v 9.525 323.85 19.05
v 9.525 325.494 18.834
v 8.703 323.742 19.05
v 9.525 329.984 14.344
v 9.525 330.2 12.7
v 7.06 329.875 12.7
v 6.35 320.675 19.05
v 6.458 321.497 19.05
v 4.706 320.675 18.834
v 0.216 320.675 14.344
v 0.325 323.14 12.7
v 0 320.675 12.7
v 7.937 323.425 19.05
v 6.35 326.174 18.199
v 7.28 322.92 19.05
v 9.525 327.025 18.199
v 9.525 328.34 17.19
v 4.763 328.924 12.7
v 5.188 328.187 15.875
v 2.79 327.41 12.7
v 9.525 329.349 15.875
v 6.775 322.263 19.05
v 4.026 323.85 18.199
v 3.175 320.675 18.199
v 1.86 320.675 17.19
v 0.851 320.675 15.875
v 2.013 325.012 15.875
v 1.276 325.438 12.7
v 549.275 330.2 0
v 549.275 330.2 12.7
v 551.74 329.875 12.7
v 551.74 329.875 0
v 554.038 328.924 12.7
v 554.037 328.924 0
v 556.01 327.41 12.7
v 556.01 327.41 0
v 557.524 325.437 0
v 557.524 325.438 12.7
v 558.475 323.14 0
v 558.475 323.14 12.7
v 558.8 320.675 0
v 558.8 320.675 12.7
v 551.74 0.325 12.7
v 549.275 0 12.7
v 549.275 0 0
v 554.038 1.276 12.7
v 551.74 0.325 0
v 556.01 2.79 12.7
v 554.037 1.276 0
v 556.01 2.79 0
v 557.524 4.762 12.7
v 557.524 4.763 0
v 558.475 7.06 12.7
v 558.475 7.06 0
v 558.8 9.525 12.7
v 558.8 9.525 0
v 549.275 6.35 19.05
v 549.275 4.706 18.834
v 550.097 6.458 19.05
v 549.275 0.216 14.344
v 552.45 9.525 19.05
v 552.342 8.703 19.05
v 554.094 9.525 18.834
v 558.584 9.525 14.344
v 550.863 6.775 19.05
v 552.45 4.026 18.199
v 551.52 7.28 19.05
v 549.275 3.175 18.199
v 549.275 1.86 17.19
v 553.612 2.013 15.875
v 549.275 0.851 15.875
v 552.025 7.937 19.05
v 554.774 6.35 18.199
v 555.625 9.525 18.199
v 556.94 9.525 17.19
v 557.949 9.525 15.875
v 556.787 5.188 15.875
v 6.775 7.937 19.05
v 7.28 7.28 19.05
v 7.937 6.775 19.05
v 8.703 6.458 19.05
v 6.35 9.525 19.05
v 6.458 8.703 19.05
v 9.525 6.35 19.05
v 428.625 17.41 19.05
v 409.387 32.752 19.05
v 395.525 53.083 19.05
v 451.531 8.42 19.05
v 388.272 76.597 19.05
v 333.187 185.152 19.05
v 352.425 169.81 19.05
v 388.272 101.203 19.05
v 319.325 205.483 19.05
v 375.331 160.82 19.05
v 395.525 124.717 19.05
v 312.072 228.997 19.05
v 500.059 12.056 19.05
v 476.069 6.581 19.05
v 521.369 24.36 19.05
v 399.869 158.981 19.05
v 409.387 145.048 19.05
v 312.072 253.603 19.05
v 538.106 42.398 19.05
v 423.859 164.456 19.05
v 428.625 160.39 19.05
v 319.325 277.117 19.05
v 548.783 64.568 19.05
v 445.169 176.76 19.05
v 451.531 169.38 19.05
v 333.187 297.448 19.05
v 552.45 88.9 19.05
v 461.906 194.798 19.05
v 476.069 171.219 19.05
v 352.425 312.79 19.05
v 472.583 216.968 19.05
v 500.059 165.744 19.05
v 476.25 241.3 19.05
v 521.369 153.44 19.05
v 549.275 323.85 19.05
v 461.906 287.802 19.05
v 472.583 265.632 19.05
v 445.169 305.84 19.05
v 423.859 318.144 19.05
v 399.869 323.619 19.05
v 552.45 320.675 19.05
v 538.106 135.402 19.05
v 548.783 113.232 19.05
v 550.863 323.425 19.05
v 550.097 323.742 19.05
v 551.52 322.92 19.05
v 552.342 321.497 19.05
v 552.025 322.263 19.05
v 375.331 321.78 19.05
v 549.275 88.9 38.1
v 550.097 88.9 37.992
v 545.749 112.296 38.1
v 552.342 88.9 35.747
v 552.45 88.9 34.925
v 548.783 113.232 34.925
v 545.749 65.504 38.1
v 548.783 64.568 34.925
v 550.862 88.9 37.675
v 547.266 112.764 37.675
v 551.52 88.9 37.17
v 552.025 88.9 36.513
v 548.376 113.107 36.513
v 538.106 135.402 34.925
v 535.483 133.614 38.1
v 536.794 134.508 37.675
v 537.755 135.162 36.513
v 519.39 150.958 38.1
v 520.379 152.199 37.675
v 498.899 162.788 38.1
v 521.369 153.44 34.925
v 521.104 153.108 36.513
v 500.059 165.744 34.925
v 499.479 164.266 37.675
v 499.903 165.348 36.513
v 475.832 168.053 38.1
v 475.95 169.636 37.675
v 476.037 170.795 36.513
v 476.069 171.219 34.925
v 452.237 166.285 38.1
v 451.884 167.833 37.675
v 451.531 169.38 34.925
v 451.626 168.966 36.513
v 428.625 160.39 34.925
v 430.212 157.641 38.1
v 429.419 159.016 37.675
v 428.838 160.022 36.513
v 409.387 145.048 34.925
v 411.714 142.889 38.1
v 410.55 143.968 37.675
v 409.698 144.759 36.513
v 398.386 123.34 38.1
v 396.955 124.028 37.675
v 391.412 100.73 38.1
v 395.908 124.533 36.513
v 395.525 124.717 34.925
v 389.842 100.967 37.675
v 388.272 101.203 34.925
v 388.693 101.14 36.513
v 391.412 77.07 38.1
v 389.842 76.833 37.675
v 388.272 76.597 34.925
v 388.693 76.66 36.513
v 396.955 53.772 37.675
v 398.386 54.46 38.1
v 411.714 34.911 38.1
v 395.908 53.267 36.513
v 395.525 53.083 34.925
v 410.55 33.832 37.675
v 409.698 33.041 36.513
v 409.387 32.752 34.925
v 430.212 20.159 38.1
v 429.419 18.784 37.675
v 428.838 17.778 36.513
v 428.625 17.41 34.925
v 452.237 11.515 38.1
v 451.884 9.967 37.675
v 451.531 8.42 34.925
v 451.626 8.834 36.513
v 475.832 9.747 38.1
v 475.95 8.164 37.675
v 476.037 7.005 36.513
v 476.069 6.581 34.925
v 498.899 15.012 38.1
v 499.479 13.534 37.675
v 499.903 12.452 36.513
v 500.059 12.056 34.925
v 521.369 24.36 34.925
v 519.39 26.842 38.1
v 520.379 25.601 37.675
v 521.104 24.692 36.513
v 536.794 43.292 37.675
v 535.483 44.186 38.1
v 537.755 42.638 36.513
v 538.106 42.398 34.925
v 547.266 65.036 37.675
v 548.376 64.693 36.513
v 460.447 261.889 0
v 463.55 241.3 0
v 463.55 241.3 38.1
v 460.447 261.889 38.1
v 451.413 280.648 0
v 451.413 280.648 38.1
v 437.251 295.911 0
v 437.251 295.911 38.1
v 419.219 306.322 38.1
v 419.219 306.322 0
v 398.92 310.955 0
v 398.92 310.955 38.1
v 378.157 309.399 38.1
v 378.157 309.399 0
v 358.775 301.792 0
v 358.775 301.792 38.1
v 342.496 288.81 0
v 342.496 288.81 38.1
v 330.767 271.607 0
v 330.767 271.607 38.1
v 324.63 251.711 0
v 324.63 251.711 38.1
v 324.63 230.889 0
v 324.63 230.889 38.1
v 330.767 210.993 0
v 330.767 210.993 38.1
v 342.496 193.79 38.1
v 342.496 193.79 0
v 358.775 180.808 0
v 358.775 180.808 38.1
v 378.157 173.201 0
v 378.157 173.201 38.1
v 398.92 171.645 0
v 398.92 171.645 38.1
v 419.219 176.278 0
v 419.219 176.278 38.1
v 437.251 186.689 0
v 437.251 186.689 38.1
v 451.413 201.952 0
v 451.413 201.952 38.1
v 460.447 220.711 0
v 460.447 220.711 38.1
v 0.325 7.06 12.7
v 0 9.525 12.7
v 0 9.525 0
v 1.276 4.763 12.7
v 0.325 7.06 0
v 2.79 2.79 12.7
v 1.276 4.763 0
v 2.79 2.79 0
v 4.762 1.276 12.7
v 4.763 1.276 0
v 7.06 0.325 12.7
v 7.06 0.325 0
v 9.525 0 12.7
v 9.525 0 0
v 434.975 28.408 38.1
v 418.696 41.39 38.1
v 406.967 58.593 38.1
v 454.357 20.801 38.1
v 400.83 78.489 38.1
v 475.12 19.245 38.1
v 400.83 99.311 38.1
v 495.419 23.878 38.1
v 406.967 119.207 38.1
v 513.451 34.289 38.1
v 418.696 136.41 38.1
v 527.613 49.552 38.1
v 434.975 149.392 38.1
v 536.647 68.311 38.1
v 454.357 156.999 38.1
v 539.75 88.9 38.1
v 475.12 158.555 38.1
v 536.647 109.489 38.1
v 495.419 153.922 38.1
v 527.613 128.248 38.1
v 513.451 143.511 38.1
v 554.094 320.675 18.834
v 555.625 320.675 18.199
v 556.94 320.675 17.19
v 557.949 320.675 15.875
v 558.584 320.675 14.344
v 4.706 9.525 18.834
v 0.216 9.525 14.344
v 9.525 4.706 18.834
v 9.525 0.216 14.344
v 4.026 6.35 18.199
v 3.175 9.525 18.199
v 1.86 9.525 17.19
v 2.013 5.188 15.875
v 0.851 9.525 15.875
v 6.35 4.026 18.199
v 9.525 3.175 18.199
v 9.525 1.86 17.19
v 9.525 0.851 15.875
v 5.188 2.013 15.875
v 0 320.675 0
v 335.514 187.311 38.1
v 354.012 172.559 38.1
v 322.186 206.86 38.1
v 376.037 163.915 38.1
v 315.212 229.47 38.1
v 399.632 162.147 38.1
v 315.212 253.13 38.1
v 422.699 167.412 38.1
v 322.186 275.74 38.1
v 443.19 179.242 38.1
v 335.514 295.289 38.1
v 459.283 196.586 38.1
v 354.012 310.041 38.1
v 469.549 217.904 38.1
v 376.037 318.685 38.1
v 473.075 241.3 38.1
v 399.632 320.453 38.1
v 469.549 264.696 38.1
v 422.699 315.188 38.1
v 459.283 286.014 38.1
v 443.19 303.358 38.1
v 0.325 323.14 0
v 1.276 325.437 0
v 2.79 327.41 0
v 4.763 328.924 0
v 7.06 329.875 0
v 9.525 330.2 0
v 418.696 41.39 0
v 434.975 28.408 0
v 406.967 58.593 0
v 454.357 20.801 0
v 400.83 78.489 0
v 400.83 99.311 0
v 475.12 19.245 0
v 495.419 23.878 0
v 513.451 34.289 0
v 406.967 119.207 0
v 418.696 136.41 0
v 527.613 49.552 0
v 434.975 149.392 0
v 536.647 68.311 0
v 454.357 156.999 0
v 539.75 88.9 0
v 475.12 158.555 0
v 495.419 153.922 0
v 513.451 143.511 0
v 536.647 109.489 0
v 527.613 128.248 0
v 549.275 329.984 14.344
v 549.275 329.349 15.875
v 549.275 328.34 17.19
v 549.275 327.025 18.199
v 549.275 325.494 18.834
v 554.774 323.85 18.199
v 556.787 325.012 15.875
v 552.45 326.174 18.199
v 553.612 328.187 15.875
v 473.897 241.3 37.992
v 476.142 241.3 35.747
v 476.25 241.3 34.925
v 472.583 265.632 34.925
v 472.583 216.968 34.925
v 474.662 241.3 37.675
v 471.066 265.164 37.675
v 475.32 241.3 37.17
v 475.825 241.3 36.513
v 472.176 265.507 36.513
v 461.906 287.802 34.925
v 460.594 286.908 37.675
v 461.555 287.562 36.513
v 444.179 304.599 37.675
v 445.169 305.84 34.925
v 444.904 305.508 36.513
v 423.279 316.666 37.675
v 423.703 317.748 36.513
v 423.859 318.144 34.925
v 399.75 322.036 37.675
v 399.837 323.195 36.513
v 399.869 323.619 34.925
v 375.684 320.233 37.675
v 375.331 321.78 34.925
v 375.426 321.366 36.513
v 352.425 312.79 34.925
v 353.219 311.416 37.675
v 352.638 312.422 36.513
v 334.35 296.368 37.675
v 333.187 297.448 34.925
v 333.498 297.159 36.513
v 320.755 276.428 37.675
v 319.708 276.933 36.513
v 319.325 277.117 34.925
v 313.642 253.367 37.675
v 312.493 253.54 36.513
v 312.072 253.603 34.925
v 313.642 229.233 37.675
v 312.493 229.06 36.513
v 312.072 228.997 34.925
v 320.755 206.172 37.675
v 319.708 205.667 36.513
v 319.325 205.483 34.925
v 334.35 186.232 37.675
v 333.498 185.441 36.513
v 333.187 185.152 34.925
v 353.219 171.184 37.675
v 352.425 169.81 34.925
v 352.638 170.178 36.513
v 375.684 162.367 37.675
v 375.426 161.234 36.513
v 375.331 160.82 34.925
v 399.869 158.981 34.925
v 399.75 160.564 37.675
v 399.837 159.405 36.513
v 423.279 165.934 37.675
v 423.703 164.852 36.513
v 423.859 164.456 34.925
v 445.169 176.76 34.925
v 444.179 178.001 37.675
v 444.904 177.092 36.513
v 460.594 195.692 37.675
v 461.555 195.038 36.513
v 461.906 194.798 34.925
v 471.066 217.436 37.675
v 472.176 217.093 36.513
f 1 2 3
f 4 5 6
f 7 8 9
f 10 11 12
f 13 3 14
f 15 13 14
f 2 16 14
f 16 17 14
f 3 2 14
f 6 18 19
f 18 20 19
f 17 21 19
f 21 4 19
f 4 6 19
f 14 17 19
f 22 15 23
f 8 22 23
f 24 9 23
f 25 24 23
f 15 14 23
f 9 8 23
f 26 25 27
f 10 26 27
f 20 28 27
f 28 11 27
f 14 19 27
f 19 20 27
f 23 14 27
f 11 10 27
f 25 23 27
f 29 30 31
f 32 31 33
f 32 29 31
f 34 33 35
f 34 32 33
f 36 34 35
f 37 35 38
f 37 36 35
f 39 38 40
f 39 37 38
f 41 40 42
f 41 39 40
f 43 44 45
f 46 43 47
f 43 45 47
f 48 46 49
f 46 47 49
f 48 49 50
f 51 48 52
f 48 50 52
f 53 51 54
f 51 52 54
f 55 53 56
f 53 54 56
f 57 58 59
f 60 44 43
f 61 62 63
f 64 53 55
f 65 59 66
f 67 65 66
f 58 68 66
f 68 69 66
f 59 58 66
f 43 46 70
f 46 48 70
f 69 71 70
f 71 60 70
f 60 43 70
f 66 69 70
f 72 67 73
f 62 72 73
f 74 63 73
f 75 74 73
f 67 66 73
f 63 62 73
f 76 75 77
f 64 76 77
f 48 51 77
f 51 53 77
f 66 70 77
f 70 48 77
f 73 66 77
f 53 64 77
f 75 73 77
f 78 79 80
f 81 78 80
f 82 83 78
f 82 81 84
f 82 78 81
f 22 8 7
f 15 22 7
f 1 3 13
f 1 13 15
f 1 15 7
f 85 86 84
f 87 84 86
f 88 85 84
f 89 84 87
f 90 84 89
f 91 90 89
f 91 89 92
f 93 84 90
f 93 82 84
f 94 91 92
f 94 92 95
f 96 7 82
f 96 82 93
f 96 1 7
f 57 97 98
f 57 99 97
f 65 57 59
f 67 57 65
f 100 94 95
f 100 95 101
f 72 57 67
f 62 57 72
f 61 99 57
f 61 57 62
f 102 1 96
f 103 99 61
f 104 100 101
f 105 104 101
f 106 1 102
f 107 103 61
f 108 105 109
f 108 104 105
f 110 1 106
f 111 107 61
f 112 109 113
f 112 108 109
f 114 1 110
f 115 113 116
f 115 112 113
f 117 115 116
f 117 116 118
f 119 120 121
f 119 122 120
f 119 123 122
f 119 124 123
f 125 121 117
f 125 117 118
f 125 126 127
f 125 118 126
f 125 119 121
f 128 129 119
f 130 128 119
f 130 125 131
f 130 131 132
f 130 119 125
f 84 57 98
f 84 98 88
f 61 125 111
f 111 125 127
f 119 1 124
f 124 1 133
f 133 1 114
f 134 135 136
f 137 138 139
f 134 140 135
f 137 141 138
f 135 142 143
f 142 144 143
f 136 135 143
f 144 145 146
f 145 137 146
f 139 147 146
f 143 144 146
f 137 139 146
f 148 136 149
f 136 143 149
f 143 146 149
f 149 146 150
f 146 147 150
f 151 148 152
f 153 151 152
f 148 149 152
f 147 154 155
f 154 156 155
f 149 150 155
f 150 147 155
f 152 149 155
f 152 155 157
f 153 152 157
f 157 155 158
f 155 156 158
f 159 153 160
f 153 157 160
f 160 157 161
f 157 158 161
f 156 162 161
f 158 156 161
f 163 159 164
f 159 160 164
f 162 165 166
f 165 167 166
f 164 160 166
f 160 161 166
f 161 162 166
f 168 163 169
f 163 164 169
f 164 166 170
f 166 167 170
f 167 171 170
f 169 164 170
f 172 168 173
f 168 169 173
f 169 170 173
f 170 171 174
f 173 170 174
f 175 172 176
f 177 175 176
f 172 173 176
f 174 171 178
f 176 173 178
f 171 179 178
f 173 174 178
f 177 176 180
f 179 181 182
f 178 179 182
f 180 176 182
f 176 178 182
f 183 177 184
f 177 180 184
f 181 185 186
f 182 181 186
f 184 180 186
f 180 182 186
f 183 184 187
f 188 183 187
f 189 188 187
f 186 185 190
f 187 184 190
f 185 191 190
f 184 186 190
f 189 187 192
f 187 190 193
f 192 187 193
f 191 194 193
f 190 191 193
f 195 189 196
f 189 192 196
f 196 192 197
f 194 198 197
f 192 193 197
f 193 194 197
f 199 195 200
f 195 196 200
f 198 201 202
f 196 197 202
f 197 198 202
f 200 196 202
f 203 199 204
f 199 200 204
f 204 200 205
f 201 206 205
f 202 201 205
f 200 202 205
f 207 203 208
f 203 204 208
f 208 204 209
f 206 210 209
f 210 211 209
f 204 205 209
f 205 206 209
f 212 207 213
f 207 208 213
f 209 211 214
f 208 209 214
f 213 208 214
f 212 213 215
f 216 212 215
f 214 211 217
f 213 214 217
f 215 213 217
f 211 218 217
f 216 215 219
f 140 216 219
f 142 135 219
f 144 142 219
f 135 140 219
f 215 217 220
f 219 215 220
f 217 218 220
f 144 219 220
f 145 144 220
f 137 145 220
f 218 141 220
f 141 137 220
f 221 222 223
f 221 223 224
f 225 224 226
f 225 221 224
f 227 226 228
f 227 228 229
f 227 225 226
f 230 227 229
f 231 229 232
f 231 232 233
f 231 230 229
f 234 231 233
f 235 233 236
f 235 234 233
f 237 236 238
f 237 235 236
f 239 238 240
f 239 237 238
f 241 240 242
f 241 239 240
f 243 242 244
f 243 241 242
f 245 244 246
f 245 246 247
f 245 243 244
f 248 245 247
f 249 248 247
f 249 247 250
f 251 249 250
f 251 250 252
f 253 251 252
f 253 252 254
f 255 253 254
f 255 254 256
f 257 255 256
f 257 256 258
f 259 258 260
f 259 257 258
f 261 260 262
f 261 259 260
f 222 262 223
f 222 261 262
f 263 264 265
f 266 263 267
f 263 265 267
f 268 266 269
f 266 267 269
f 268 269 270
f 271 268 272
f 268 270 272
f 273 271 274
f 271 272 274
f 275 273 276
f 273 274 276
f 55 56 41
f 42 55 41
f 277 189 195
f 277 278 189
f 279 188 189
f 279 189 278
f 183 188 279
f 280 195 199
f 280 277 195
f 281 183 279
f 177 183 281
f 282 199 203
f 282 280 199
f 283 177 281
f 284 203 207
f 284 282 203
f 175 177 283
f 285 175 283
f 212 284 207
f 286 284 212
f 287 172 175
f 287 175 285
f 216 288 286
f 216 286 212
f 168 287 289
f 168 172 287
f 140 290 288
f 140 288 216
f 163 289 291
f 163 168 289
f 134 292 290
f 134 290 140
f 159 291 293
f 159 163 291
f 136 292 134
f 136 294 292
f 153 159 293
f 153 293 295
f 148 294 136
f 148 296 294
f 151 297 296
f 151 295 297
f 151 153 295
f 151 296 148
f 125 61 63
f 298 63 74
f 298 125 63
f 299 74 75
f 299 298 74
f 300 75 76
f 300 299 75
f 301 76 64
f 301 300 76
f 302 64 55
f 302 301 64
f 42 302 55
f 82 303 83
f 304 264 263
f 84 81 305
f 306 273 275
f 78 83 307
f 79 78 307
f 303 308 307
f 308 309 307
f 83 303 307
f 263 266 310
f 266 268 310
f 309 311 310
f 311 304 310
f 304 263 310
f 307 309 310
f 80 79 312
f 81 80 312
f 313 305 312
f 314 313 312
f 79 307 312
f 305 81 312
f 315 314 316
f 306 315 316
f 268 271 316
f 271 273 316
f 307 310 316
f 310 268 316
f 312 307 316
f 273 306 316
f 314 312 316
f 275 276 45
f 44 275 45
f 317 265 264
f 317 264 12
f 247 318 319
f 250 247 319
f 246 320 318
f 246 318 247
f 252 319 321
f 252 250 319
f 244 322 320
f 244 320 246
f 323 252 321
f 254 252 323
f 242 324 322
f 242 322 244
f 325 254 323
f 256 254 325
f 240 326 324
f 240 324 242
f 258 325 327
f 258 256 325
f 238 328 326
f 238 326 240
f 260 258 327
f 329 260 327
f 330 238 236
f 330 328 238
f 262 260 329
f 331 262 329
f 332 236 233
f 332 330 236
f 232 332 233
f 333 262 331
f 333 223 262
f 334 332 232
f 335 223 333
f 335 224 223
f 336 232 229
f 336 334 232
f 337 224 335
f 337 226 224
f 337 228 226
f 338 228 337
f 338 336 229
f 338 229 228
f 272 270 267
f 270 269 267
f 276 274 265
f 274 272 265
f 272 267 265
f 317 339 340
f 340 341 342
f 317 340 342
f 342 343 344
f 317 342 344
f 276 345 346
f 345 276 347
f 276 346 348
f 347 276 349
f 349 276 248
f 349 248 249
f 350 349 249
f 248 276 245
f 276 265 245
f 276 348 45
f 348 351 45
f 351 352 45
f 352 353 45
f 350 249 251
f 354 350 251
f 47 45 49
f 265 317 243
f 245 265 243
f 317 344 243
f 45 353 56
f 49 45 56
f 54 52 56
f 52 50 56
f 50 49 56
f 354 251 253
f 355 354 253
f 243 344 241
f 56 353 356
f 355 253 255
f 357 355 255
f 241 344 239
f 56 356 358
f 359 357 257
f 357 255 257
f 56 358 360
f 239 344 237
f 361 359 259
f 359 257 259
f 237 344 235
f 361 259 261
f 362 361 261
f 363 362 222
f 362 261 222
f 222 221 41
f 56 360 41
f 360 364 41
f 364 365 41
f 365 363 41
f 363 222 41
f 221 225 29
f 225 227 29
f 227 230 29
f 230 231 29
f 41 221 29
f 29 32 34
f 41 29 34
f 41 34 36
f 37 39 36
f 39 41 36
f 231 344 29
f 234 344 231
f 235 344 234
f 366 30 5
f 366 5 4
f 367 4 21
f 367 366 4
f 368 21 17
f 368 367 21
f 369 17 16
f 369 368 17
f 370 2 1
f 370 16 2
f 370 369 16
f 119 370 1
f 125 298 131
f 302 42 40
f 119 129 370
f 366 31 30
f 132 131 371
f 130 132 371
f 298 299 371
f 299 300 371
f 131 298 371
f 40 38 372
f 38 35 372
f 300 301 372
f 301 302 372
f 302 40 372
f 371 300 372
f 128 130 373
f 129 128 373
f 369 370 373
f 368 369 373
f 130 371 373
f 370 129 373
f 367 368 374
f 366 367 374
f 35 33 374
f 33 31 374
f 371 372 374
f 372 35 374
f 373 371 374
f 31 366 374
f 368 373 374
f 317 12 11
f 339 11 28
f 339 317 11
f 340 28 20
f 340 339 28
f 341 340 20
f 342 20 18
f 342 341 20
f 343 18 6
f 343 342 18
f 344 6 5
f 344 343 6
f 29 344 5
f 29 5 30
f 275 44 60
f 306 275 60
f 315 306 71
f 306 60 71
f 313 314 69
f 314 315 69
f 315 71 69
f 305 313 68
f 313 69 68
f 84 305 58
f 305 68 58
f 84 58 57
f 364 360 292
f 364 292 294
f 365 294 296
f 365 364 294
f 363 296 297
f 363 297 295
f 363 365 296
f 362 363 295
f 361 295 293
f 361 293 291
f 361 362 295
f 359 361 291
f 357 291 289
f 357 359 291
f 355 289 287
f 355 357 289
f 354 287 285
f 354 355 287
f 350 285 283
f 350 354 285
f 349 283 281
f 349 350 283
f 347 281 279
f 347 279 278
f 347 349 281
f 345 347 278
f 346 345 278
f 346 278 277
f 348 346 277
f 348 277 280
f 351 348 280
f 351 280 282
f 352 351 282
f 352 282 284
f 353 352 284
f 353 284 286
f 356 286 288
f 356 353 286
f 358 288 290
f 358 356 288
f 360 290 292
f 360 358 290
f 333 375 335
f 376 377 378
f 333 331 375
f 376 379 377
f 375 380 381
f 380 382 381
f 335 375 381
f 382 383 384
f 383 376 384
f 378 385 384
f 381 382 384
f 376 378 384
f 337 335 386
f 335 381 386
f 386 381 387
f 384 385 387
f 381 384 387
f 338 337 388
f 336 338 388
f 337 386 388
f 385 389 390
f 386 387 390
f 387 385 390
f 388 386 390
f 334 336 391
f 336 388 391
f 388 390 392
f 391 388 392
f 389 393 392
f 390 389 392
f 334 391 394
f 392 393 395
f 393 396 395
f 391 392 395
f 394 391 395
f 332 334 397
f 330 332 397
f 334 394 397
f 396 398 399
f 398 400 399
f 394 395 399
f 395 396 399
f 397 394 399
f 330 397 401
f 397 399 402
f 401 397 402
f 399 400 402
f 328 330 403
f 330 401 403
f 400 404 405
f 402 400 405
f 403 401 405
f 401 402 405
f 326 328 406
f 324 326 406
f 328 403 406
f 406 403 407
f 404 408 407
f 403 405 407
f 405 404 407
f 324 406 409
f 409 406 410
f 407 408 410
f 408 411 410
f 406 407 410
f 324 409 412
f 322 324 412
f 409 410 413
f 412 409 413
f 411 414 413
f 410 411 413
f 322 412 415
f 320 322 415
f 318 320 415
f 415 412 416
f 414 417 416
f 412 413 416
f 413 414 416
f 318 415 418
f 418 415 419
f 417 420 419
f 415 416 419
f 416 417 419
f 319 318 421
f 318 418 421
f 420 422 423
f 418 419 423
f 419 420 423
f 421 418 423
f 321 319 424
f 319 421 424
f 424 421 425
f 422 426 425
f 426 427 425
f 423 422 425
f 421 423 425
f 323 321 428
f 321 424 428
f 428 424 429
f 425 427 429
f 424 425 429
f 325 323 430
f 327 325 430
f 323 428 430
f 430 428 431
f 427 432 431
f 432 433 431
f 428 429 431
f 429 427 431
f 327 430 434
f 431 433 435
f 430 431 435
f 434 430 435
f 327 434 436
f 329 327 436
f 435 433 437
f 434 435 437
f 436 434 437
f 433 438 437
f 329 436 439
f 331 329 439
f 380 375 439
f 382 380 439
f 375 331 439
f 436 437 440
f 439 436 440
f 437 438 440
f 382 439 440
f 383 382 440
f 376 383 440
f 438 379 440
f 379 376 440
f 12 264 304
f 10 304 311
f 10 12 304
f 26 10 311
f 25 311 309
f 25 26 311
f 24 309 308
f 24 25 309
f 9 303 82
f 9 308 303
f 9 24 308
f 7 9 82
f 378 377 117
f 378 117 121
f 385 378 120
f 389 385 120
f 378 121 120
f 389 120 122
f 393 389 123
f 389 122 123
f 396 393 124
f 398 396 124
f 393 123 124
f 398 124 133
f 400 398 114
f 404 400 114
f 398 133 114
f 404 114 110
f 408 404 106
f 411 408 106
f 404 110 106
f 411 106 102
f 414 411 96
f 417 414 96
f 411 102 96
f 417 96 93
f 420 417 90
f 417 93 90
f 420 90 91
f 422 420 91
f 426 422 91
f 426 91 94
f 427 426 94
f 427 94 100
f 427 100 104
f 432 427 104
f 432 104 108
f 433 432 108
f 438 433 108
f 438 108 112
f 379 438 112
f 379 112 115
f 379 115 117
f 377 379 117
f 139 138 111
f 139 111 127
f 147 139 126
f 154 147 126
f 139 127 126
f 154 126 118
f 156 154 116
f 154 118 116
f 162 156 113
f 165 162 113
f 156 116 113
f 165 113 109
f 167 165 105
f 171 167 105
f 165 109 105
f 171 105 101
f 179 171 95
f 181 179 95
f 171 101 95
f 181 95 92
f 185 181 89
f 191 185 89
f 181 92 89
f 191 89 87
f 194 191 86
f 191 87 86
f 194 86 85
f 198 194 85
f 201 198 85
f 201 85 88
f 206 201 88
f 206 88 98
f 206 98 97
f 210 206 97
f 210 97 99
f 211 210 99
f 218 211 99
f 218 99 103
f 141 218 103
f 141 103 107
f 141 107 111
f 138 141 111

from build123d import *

# Parameters (mm, degrees)
F0_R         = 82.55
F0_R_2       = 69.85
F1_DEPTH     = 38.1
F0_W         = 558.8
F0_H         = 330.2
F2_DEPTH     = 19.05
F3_R         = 6.34999
F4_T1_DEPTH  = 42.8625
F4_T4_ANGLE  = 90
F4_T6_ANGLE  = 90
F4_T8_ANGLE  = 90
F4_T10_ANGLE = 90
F5_R         = 3.175


# Not quite as in the source:
# - a fillet or chamfer that OpenCascade refuses, or shapes differently, is made with other operations: its cross-section is extruded or revolved along the edge and cut away or added
# - a fillet or chamfer is up to 0.001 mm smaller than in the source, because OpenCascade refuses the exact size


with BuildPart() as f1:
    # F0 (on Top) → F1 (new body)
    with BuildSketch(Plane.XY):
        with Locations((393.7, 241.3)):
            Circle(F0_R)
        with Locations((393.7, 241.3)):
            Circle(F0_R_2, mode=Mode.SUBTRACT)
    extrude(amount=F1_DEPTH)



with BuildPart() as f1b:
    # F0 (on Top) → F1, piece 2 (new body)
    with BuildSketch(Plane.XY):
        with Locations((469.9, 88.9)):
            Circle(F0_R)
        with Locations((469.9, 88.9)):
            Circle(F0_R_2, mode=Mode.SUBTRACT)
    extrude(amount=F1_DEPTH)


with BuildPart() as f1_1:
    add(f1.part)

    add(f1b.part)  # F2 merges F1b
    # F0 (on Top) → F2 (join)
    with BuildSketch(Plane.XY):
        with Locations((279.4, 165.1)):
            Rectangle(F0_W, F0_H)
        with Locations((469.9, 88.9)):
            Circle(F0_R, mode=Mode.SUBTRACT)
        with Locations((393.7, 241.3)):
            Circle(F0_R, mode=Mode.SUBTRACT)
    extrude(amount=F2_DEPTH)

    # F3 (radius 6.35 in the source; OpenCascade refuses exactly that, so slightly less here)
    f3_edges = [f1_1.edges().sort_by_distance(p)[0] for p in [
        (0, 165.1, 19.05),
        (279.4, 330.2, 19.05),
        (279.4, 0, 19.05),
        (558.8, 165.1, 19.05),
    ]]
    fillet(f3_edges, radius=F3_R)

    # F4: fillet of radius 9.525 on 4 edges, made by hand

    # F4_s2 → F4_t1 (cut)
    with BuildSketch(Plane.XY.offset(-23.8125)):
        with BuildLine():
            ThreePointArc((0, 9.525), (2.7898079092, 2.7898079092), (9.525, 0))
            Line((9.525, 0), (0, 0))
            Line((0, 0), (0, 9.525))
        make_face()
        with BuildLine():
            ThreePointArc((549.275, 0), (556.0101920908, 2.7898079092), (558.8, 9.525))
            Line((558.8, 9.525), (558.8, 0))
            Line((558.8, 0), (549.275, 0))
        make_face()
        with BuildLine():
            ThreePointArc((549.275, 330.2), (556.0101920908, 327.4101920908), (558.8, 320.675))
            Line((558.8, 320.675), (558.8, 330.2))
            Line((558.8, 330.2), (549.275, 330.2))
        make_face()
        with BuildLine():
            ThreePointArc((0, 320.675), (2.7898079092, 327.4101920908), (9.525, 330.2))
            Line((9.525, 330.2), (0, 330.2))
            Line((0, 330.2), (0, 320.675))
        make_face()
    extrude(amount=F4_T1_DEPTH, mode=Mode.SUBTRACT)

    # F4_s3 → F4_t4 (revolve, cut)
    with BuildSketch(Plane.YZ.offset(9.525)):
        with BuildLine():
            ThreePointArc((323.85001, 19.05), (328.3401309895, 17.1901309895), (330.2, 12.70001))
            Line((330.2, 12.70001), (330.2, 19.05))
            Line((330.2, 19.05), (323.85001, 19.05))
        make_face()
    revolve(axis=Axis((9.525, 320.675, 19.05), (0, 0, 1)), revolution_arc=F4_T4_ANGLE, mode=Mode.SUBTRACT)

    # F4_s5 → F4_t6 (revolve, cut)
    with BuildSketch(Plane.XZ.offset(-320.675)):
        with BuildLine():
            ThreePointArc((552.45001, 19.05), (556.9401309895, 17.1901309895), (558.8, 12.70001))
            Line((558.8, 12.70001), (558.8, 19.05))
            Line((558.8, 19.05), (552.45001, 19.05))
        make_face()
    revolve(axis=Axis((549.275, 320.675, 19.05), (0, 0, 1)), revolution_arc=F4_T6_ANGLE, mode=Mode.SUBTRACT)

    # F4_s7 → F4_t8 (revolve, cut)
    with BuildSketch(Plane.YZ.offset(549.275)):
        with BuildLine():
            ThreePointArc((6.34999, 19.05), (1.8598690105, 17.1901309895), (0, 12.70001))
            Line((0, 12.70001), (0, 19.05))
            Line((0, 19.05), (6.34999, 19.05))
        make_face()
    revolve(axis=Axis((549.275, 9.525, 19.05), (0, 0, 1)), revolution_arc=F4_T8_ANGLE, mode=Mode.SUBTRACT)

    # F4_s9 → F4_t10 (revolve, cut)
    with BuildSketch(Plane.XZ.offset(-9.525)):
        with BuildLine():
            ThreePointArc((6.34999, 19.05), (1.8598690105, 17.1901309895), (0, 12.70001))
            Line((0, 12.70001), (0, 19.05))
            Line((0, 19.05), (6.34999, 19.05))
        make_face()
    revolve(axis=Axis((9.525, 9.525, 19.05), (0, 0, 1)), revolution_arc=F4_T10_ANGLE, mode=Mode.SUBTRACT)

    # F5
    f5_edges = [f1_1.edges().sort_by_distance(p)[0] for p in [
        (387.35, 88.9, 38.1),
        (311.15, 241.3, 38.1),
    ]]
    fillet(f5_edges, radius=F5_R)


solid = f1_1.part
